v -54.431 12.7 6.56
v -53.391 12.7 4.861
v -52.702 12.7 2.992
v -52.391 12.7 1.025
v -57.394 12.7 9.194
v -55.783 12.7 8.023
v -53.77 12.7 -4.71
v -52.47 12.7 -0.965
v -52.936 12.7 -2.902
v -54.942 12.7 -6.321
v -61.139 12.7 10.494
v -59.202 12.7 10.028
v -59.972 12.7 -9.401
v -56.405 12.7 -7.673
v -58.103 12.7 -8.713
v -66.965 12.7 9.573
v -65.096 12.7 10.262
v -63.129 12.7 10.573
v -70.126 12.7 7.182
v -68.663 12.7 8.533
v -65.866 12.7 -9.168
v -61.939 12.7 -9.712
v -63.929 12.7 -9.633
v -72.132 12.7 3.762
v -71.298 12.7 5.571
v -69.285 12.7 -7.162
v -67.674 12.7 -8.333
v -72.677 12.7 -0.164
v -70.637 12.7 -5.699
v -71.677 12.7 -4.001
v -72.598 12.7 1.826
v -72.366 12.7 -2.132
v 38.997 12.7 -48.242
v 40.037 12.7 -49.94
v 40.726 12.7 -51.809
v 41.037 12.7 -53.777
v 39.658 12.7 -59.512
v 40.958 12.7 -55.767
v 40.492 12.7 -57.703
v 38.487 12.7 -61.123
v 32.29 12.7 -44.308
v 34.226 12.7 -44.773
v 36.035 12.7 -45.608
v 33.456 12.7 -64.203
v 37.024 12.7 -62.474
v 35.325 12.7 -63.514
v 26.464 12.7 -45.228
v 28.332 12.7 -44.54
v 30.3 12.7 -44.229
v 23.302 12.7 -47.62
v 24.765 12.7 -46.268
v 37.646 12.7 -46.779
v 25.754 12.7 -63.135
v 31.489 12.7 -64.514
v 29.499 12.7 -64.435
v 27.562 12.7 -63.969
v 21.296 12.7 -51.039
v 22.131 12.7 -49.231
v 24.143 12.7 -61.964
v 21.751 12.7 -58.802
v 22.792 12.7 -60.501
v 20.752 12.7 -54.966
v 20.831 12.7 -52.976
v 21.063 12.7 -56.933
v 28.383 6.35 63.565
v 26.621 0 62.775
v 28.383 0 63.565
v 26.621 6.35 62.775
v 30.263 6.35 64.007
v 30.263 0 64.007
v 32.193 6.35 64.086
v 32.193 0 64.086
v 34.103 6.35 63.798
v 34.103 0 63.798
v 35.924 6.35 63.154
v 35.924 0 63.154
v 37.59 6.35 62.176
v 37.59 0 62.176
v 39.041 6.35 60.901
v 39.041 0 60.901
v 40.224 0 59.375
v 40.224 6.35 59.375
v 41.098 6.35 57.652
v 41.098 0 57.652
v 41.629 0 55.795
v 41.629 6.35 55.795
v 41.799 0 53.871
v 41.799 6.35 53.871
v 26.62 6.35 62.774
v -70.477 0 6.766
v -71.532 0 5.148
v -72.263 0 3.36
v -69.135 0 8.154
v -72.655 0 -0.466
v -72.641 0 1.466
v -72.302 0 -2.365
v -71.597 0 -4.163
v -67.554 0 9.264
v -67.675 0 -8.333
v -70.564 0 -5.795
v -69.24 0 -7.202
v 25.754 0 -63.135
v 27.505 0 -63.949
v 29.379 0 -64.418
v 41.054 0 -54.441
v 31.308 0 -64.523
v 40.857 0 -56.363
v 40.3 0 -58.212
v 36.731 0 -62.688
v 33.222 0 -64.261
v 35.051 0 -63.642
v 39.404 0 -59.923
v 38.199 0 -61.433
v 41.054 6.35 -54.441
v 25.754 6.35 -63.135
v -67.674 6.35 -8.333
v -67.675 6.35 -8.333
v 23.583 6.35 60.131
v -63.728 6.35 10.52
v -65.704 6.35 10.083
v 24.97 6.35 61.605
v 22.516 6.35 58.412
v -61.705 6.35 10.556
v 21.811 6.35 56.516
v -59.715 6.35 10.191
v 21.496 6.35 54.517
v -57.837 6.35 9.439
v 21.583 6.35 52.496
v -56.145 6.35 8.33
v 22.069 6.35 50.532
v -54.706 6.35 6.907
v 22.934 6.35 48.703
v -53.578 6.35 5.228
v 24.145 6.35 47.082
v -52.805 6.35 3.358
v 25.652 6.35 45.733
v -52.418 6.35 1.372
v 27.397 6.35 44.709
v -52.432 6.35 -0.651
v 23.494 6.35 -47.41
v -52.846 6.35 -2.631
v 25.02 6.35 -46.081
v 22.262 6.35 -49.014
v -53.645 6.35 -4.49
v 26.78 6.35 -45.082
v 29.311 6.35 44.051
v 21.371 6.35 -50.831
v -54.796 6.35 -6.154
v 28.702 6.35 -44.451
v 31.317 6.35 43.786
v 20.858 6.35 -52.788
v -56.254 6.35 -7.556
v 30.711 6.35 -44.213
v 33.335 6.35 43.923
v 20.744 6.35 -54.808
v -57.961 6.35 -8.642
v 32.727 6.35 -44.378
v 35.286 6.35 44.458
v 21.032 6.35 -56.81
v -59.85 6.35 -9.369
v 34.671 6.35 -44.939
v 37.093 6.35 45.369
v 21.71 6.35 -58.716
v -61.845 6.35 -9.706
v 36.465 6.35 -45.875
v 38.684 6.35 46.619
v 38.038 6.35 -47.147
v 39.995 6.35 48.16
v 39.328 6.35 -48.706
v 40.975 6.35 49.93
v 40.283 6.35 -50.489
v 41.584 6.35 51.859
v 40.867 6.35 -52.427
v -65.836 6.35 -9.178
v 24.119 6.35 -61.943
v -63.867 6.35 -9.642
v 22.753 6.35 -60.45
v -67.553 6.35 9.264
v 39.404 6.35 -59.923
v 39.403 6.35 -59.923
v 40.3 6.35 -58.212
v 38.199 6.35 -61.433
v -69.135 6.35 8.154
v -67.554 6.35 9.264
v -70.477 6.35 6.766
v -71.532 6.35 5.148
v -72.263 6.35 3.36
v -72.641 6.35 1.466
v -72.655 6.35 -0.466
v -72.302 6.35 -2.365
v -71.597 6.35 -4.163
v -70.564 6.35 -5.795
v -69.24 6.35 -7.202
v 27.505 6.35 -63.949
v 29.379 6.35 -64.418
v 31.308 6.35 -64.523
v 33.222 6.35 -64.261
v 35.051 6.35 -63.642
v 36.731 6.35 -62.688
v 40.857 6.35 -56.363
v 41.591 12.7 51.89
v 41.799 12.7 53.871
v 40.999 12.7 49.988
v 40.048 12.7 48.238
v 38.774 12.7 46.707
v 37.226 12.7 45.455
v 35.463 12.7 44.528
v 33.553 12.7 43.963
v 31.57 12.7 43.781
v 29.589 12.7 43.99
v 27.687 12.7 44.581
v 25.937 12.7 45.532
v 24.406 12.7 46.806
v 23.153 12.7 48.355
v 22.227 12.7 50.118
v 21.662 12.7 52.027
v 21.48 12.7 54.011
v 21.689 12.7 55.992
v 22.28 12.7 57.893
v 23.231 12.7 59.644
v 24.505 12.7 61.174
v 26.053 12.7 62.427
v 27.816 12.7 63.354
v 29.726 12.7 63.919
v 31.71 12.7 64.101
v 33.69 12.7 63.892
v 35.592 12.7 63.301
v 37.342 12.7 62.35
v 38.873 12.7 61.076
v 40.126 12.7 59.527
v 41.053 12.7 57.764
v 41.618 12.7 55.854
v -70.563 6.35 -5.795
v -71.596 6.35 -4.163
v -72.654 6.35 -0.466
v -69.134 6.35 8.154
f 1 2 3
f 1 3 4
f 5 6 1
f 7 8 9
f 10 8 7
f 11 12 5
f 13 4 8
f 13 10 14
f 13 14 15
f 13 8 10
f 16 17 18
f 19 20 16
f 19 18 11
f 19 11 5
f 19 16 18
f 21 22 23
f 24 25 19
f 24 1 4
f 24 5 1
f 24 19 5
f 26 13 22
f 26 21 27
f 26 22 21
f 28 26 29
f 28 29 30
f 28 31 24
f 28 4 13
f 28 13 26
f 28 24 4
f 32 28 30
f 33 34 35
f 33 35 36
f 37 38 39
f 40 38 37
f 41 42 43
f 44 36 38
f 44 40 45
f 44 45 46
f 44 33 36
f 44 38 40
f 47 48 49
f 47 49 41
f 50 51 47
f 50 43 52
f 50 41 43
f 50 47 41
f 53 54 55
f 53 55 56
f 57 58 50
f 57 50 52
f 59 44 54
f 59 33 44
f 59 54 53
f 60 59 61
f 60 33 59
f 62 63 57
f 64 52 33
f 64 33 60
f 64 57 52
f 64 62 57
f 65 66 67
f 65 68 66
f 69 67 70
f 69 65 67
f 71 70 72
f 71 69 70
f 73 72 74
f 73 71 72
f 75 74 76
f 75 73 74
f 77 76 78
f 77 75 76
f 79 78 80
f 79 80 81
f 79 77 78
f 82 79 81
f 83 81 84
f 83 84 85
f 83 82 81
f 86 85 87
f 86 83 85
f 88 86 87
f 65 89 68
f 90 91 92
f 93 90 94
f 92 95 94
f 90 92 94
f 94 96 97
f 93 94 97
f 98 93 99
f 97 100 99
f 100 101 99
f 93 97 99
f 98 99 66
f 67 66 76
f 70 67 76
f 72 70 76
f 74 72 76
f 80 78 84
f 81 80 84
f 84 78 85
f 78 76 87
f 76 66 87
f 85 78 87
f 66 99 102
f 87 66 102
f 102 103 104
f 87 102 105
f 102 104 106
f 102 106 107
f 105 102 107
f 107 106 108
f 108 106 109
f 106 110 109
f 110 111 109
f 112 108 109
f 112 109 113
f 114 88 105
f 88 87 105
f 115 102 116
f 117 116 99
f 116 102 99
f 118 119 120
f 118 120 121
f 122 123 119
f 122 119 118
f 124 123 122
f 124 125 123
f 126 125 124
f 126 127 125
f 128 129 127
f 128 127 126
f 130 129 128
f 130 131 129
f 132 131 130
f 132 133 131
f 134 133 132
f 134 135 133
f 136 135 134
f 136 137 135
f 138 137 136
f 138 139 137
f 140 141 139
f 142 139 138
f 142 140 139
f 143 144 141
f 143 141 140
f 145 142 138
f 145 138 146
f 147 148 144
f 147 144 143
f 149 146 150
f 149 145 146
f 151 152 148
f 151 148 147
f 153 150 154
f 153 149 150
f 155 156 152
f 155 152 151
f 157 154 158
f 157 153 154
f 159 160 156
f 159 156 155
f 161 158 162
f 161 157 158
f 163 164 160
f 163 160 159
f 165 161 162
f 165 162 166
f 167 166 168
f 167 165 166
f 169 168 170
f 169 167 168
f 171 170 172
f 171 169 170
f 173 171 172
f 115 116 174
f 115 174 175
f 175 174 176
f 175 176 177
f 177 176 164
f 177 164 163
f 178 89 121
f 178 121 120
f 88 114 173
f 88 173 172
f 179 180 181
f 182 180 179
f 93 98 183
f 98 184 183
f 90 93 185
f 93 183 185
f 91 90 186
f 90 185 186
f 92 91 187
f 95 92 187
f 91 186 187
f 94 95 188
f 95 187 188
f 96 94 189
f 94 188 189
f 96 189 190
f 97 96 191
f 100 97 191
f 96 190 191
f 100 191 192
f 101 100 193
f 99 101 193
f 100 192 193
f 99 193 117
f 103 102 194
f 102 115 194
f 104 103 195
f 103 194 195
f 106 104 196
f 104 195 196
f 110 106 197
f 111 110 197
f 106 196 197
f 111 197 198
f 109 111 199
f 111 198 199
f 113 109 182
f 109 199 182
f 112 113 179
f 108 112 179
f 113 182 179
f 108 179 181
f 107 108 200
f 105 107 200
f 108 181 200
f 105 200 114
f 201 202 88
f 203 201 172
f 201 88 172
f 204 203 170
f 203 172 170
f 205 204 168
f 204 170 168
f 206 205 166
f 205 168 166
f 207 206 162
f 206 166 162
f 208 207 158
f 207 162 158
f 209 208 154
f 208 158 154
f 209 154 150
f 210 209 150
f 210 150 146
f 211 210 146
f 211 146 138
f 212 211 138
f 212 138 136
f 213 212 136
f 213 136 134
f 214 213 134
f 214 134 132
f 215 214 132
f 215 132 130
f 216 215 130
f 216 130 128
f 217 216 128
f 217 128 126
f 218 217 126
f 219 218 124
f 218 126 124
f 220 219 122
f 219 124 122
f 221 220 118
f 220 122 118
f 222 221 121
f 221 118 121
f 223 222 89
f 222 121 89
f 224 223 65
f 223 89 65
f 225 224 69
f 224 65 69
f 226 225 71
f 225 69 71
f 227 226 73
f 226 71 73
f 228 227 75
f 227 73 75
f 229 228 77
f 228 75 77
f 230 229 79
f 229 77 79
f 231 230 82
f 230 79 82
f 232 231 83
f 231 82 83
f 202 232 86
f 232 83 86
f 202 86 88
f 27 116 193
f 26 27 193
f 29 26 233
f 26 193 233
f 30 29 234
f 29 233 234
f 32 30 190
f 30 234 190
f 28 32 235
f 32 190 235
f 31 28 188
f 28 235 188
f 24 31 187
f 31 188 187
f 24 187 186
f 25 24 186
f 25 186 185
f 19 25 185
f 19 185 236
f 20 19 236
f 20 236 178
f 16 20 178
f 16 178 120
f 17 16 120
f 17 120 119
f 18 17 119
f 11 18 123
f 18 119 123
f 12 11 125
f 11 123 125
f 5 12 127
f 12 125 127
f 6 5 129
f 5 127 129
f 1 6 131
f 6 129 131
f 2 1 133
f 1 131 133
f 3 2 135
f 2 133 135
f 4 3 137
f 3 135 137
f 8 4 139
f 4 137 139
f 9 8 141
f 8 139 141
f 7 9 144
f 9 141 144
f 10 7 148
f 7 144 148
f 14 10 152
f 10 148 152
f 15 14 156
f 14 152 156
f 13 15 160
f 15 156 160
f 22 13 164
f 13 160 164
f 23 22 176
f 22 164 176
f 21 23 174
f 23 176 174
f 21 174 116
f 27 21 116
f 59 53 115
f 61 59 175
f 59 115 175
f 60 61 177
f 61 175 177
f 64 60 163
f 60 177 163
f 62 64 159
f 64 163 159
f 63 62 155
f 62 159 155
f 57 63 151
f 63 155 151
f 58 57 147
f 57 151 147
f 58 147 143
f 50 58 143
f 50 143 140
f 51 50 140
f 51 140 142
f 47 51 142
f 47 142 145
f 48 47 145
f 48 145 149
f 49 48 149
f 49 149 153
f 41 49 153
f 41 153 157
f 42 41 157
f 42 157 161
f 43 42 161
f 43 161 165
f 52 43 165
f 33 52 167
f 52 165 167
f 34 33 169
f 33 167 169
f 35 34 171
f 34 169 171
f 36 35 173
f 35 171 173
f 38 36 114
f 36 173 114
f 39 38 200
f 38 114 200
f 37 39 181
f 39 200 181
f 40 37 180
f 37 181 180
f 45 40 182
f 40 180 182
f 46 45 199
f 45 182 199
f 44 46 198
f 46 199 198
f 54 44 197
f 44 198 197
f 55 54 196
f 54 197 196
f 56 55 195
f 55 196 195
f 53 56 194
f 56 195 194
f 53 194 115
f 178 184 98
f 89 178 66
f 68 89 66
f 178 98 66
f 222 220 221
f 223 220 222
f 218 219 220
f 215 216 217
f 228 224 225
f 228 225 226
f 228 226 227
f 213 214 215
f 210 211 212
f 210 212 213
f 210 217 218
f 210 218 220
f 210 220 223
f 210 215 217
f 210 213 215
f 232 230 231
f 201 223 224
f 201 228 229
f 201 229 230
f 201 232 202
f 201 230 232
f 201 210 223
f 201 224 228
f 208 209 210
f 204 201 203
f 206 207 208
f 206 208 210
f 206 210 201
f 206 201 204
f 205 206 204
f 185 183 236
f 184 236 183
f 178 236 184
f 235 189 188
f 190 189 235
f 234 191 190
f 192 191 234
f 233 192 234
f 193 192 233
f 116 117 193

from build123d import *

# Parameters (mm, degrees)
BOSS_EXTRUDE1_DEPTH = 6.35
SKETCH2_R           = 10.16
BOSS_EXTRUDE2_DEPTH = 6.35
FILLET1_R           = 10.16


with BuildPart() as part:
    # Sketch1 → Boss-Extrude1 (new body)
    with BuildSketch(Plane(origin=(0, 0, 0), x_dir=(1, 0, 0), z_dir=(0, 1, 0))):
        Polygon((40.933013594, 72.038381655), (-82.853575358, -0.570161201), (41.920561763, -71.468220453), align=None)
    extrude(amount=BOSS_EXTRUDE1_DEPTH)

    # Sketch2 → Boss-Extrude2 (add)
    with BuildSketch(Plane(origin=(0, 6.35, 0), x_dir=(1, 0, 0), z_dir=(0, 1, 0))):
        with Locations(Location((-62.534056475, -0.430331372, 0), (0, 0, 120.394277672))):
            Circle(SKETCH2_R)
        with Locations(Location((30.894350337, 54.371247195, 0), (0, 0, 120.394277672))):
            Circle(SKETCH2_R)
        with Locations(Location((31.639706138, -53.940915823, 0), (0, 0, 0.394277672))):
            Circle(SKETCH2_R)
    extrude(amount=BOSS_EXTRUDE2_DEPTH)

    # Fillet1
    fillet1_edges = [part.edges().sort_by_distance(p)[0] for p in [
        (40.933013594, 3.175, -72.038381655),
        (41.920561763, 3.175, 71.468220453),
        (-82.853575358, 3.175, 0.570161201),
    ]]
    fillet(fillet1_edges, radius=FILLET1_R - 0.0001)  # a hair under: the kernel refuses the full size


solid = part.part
